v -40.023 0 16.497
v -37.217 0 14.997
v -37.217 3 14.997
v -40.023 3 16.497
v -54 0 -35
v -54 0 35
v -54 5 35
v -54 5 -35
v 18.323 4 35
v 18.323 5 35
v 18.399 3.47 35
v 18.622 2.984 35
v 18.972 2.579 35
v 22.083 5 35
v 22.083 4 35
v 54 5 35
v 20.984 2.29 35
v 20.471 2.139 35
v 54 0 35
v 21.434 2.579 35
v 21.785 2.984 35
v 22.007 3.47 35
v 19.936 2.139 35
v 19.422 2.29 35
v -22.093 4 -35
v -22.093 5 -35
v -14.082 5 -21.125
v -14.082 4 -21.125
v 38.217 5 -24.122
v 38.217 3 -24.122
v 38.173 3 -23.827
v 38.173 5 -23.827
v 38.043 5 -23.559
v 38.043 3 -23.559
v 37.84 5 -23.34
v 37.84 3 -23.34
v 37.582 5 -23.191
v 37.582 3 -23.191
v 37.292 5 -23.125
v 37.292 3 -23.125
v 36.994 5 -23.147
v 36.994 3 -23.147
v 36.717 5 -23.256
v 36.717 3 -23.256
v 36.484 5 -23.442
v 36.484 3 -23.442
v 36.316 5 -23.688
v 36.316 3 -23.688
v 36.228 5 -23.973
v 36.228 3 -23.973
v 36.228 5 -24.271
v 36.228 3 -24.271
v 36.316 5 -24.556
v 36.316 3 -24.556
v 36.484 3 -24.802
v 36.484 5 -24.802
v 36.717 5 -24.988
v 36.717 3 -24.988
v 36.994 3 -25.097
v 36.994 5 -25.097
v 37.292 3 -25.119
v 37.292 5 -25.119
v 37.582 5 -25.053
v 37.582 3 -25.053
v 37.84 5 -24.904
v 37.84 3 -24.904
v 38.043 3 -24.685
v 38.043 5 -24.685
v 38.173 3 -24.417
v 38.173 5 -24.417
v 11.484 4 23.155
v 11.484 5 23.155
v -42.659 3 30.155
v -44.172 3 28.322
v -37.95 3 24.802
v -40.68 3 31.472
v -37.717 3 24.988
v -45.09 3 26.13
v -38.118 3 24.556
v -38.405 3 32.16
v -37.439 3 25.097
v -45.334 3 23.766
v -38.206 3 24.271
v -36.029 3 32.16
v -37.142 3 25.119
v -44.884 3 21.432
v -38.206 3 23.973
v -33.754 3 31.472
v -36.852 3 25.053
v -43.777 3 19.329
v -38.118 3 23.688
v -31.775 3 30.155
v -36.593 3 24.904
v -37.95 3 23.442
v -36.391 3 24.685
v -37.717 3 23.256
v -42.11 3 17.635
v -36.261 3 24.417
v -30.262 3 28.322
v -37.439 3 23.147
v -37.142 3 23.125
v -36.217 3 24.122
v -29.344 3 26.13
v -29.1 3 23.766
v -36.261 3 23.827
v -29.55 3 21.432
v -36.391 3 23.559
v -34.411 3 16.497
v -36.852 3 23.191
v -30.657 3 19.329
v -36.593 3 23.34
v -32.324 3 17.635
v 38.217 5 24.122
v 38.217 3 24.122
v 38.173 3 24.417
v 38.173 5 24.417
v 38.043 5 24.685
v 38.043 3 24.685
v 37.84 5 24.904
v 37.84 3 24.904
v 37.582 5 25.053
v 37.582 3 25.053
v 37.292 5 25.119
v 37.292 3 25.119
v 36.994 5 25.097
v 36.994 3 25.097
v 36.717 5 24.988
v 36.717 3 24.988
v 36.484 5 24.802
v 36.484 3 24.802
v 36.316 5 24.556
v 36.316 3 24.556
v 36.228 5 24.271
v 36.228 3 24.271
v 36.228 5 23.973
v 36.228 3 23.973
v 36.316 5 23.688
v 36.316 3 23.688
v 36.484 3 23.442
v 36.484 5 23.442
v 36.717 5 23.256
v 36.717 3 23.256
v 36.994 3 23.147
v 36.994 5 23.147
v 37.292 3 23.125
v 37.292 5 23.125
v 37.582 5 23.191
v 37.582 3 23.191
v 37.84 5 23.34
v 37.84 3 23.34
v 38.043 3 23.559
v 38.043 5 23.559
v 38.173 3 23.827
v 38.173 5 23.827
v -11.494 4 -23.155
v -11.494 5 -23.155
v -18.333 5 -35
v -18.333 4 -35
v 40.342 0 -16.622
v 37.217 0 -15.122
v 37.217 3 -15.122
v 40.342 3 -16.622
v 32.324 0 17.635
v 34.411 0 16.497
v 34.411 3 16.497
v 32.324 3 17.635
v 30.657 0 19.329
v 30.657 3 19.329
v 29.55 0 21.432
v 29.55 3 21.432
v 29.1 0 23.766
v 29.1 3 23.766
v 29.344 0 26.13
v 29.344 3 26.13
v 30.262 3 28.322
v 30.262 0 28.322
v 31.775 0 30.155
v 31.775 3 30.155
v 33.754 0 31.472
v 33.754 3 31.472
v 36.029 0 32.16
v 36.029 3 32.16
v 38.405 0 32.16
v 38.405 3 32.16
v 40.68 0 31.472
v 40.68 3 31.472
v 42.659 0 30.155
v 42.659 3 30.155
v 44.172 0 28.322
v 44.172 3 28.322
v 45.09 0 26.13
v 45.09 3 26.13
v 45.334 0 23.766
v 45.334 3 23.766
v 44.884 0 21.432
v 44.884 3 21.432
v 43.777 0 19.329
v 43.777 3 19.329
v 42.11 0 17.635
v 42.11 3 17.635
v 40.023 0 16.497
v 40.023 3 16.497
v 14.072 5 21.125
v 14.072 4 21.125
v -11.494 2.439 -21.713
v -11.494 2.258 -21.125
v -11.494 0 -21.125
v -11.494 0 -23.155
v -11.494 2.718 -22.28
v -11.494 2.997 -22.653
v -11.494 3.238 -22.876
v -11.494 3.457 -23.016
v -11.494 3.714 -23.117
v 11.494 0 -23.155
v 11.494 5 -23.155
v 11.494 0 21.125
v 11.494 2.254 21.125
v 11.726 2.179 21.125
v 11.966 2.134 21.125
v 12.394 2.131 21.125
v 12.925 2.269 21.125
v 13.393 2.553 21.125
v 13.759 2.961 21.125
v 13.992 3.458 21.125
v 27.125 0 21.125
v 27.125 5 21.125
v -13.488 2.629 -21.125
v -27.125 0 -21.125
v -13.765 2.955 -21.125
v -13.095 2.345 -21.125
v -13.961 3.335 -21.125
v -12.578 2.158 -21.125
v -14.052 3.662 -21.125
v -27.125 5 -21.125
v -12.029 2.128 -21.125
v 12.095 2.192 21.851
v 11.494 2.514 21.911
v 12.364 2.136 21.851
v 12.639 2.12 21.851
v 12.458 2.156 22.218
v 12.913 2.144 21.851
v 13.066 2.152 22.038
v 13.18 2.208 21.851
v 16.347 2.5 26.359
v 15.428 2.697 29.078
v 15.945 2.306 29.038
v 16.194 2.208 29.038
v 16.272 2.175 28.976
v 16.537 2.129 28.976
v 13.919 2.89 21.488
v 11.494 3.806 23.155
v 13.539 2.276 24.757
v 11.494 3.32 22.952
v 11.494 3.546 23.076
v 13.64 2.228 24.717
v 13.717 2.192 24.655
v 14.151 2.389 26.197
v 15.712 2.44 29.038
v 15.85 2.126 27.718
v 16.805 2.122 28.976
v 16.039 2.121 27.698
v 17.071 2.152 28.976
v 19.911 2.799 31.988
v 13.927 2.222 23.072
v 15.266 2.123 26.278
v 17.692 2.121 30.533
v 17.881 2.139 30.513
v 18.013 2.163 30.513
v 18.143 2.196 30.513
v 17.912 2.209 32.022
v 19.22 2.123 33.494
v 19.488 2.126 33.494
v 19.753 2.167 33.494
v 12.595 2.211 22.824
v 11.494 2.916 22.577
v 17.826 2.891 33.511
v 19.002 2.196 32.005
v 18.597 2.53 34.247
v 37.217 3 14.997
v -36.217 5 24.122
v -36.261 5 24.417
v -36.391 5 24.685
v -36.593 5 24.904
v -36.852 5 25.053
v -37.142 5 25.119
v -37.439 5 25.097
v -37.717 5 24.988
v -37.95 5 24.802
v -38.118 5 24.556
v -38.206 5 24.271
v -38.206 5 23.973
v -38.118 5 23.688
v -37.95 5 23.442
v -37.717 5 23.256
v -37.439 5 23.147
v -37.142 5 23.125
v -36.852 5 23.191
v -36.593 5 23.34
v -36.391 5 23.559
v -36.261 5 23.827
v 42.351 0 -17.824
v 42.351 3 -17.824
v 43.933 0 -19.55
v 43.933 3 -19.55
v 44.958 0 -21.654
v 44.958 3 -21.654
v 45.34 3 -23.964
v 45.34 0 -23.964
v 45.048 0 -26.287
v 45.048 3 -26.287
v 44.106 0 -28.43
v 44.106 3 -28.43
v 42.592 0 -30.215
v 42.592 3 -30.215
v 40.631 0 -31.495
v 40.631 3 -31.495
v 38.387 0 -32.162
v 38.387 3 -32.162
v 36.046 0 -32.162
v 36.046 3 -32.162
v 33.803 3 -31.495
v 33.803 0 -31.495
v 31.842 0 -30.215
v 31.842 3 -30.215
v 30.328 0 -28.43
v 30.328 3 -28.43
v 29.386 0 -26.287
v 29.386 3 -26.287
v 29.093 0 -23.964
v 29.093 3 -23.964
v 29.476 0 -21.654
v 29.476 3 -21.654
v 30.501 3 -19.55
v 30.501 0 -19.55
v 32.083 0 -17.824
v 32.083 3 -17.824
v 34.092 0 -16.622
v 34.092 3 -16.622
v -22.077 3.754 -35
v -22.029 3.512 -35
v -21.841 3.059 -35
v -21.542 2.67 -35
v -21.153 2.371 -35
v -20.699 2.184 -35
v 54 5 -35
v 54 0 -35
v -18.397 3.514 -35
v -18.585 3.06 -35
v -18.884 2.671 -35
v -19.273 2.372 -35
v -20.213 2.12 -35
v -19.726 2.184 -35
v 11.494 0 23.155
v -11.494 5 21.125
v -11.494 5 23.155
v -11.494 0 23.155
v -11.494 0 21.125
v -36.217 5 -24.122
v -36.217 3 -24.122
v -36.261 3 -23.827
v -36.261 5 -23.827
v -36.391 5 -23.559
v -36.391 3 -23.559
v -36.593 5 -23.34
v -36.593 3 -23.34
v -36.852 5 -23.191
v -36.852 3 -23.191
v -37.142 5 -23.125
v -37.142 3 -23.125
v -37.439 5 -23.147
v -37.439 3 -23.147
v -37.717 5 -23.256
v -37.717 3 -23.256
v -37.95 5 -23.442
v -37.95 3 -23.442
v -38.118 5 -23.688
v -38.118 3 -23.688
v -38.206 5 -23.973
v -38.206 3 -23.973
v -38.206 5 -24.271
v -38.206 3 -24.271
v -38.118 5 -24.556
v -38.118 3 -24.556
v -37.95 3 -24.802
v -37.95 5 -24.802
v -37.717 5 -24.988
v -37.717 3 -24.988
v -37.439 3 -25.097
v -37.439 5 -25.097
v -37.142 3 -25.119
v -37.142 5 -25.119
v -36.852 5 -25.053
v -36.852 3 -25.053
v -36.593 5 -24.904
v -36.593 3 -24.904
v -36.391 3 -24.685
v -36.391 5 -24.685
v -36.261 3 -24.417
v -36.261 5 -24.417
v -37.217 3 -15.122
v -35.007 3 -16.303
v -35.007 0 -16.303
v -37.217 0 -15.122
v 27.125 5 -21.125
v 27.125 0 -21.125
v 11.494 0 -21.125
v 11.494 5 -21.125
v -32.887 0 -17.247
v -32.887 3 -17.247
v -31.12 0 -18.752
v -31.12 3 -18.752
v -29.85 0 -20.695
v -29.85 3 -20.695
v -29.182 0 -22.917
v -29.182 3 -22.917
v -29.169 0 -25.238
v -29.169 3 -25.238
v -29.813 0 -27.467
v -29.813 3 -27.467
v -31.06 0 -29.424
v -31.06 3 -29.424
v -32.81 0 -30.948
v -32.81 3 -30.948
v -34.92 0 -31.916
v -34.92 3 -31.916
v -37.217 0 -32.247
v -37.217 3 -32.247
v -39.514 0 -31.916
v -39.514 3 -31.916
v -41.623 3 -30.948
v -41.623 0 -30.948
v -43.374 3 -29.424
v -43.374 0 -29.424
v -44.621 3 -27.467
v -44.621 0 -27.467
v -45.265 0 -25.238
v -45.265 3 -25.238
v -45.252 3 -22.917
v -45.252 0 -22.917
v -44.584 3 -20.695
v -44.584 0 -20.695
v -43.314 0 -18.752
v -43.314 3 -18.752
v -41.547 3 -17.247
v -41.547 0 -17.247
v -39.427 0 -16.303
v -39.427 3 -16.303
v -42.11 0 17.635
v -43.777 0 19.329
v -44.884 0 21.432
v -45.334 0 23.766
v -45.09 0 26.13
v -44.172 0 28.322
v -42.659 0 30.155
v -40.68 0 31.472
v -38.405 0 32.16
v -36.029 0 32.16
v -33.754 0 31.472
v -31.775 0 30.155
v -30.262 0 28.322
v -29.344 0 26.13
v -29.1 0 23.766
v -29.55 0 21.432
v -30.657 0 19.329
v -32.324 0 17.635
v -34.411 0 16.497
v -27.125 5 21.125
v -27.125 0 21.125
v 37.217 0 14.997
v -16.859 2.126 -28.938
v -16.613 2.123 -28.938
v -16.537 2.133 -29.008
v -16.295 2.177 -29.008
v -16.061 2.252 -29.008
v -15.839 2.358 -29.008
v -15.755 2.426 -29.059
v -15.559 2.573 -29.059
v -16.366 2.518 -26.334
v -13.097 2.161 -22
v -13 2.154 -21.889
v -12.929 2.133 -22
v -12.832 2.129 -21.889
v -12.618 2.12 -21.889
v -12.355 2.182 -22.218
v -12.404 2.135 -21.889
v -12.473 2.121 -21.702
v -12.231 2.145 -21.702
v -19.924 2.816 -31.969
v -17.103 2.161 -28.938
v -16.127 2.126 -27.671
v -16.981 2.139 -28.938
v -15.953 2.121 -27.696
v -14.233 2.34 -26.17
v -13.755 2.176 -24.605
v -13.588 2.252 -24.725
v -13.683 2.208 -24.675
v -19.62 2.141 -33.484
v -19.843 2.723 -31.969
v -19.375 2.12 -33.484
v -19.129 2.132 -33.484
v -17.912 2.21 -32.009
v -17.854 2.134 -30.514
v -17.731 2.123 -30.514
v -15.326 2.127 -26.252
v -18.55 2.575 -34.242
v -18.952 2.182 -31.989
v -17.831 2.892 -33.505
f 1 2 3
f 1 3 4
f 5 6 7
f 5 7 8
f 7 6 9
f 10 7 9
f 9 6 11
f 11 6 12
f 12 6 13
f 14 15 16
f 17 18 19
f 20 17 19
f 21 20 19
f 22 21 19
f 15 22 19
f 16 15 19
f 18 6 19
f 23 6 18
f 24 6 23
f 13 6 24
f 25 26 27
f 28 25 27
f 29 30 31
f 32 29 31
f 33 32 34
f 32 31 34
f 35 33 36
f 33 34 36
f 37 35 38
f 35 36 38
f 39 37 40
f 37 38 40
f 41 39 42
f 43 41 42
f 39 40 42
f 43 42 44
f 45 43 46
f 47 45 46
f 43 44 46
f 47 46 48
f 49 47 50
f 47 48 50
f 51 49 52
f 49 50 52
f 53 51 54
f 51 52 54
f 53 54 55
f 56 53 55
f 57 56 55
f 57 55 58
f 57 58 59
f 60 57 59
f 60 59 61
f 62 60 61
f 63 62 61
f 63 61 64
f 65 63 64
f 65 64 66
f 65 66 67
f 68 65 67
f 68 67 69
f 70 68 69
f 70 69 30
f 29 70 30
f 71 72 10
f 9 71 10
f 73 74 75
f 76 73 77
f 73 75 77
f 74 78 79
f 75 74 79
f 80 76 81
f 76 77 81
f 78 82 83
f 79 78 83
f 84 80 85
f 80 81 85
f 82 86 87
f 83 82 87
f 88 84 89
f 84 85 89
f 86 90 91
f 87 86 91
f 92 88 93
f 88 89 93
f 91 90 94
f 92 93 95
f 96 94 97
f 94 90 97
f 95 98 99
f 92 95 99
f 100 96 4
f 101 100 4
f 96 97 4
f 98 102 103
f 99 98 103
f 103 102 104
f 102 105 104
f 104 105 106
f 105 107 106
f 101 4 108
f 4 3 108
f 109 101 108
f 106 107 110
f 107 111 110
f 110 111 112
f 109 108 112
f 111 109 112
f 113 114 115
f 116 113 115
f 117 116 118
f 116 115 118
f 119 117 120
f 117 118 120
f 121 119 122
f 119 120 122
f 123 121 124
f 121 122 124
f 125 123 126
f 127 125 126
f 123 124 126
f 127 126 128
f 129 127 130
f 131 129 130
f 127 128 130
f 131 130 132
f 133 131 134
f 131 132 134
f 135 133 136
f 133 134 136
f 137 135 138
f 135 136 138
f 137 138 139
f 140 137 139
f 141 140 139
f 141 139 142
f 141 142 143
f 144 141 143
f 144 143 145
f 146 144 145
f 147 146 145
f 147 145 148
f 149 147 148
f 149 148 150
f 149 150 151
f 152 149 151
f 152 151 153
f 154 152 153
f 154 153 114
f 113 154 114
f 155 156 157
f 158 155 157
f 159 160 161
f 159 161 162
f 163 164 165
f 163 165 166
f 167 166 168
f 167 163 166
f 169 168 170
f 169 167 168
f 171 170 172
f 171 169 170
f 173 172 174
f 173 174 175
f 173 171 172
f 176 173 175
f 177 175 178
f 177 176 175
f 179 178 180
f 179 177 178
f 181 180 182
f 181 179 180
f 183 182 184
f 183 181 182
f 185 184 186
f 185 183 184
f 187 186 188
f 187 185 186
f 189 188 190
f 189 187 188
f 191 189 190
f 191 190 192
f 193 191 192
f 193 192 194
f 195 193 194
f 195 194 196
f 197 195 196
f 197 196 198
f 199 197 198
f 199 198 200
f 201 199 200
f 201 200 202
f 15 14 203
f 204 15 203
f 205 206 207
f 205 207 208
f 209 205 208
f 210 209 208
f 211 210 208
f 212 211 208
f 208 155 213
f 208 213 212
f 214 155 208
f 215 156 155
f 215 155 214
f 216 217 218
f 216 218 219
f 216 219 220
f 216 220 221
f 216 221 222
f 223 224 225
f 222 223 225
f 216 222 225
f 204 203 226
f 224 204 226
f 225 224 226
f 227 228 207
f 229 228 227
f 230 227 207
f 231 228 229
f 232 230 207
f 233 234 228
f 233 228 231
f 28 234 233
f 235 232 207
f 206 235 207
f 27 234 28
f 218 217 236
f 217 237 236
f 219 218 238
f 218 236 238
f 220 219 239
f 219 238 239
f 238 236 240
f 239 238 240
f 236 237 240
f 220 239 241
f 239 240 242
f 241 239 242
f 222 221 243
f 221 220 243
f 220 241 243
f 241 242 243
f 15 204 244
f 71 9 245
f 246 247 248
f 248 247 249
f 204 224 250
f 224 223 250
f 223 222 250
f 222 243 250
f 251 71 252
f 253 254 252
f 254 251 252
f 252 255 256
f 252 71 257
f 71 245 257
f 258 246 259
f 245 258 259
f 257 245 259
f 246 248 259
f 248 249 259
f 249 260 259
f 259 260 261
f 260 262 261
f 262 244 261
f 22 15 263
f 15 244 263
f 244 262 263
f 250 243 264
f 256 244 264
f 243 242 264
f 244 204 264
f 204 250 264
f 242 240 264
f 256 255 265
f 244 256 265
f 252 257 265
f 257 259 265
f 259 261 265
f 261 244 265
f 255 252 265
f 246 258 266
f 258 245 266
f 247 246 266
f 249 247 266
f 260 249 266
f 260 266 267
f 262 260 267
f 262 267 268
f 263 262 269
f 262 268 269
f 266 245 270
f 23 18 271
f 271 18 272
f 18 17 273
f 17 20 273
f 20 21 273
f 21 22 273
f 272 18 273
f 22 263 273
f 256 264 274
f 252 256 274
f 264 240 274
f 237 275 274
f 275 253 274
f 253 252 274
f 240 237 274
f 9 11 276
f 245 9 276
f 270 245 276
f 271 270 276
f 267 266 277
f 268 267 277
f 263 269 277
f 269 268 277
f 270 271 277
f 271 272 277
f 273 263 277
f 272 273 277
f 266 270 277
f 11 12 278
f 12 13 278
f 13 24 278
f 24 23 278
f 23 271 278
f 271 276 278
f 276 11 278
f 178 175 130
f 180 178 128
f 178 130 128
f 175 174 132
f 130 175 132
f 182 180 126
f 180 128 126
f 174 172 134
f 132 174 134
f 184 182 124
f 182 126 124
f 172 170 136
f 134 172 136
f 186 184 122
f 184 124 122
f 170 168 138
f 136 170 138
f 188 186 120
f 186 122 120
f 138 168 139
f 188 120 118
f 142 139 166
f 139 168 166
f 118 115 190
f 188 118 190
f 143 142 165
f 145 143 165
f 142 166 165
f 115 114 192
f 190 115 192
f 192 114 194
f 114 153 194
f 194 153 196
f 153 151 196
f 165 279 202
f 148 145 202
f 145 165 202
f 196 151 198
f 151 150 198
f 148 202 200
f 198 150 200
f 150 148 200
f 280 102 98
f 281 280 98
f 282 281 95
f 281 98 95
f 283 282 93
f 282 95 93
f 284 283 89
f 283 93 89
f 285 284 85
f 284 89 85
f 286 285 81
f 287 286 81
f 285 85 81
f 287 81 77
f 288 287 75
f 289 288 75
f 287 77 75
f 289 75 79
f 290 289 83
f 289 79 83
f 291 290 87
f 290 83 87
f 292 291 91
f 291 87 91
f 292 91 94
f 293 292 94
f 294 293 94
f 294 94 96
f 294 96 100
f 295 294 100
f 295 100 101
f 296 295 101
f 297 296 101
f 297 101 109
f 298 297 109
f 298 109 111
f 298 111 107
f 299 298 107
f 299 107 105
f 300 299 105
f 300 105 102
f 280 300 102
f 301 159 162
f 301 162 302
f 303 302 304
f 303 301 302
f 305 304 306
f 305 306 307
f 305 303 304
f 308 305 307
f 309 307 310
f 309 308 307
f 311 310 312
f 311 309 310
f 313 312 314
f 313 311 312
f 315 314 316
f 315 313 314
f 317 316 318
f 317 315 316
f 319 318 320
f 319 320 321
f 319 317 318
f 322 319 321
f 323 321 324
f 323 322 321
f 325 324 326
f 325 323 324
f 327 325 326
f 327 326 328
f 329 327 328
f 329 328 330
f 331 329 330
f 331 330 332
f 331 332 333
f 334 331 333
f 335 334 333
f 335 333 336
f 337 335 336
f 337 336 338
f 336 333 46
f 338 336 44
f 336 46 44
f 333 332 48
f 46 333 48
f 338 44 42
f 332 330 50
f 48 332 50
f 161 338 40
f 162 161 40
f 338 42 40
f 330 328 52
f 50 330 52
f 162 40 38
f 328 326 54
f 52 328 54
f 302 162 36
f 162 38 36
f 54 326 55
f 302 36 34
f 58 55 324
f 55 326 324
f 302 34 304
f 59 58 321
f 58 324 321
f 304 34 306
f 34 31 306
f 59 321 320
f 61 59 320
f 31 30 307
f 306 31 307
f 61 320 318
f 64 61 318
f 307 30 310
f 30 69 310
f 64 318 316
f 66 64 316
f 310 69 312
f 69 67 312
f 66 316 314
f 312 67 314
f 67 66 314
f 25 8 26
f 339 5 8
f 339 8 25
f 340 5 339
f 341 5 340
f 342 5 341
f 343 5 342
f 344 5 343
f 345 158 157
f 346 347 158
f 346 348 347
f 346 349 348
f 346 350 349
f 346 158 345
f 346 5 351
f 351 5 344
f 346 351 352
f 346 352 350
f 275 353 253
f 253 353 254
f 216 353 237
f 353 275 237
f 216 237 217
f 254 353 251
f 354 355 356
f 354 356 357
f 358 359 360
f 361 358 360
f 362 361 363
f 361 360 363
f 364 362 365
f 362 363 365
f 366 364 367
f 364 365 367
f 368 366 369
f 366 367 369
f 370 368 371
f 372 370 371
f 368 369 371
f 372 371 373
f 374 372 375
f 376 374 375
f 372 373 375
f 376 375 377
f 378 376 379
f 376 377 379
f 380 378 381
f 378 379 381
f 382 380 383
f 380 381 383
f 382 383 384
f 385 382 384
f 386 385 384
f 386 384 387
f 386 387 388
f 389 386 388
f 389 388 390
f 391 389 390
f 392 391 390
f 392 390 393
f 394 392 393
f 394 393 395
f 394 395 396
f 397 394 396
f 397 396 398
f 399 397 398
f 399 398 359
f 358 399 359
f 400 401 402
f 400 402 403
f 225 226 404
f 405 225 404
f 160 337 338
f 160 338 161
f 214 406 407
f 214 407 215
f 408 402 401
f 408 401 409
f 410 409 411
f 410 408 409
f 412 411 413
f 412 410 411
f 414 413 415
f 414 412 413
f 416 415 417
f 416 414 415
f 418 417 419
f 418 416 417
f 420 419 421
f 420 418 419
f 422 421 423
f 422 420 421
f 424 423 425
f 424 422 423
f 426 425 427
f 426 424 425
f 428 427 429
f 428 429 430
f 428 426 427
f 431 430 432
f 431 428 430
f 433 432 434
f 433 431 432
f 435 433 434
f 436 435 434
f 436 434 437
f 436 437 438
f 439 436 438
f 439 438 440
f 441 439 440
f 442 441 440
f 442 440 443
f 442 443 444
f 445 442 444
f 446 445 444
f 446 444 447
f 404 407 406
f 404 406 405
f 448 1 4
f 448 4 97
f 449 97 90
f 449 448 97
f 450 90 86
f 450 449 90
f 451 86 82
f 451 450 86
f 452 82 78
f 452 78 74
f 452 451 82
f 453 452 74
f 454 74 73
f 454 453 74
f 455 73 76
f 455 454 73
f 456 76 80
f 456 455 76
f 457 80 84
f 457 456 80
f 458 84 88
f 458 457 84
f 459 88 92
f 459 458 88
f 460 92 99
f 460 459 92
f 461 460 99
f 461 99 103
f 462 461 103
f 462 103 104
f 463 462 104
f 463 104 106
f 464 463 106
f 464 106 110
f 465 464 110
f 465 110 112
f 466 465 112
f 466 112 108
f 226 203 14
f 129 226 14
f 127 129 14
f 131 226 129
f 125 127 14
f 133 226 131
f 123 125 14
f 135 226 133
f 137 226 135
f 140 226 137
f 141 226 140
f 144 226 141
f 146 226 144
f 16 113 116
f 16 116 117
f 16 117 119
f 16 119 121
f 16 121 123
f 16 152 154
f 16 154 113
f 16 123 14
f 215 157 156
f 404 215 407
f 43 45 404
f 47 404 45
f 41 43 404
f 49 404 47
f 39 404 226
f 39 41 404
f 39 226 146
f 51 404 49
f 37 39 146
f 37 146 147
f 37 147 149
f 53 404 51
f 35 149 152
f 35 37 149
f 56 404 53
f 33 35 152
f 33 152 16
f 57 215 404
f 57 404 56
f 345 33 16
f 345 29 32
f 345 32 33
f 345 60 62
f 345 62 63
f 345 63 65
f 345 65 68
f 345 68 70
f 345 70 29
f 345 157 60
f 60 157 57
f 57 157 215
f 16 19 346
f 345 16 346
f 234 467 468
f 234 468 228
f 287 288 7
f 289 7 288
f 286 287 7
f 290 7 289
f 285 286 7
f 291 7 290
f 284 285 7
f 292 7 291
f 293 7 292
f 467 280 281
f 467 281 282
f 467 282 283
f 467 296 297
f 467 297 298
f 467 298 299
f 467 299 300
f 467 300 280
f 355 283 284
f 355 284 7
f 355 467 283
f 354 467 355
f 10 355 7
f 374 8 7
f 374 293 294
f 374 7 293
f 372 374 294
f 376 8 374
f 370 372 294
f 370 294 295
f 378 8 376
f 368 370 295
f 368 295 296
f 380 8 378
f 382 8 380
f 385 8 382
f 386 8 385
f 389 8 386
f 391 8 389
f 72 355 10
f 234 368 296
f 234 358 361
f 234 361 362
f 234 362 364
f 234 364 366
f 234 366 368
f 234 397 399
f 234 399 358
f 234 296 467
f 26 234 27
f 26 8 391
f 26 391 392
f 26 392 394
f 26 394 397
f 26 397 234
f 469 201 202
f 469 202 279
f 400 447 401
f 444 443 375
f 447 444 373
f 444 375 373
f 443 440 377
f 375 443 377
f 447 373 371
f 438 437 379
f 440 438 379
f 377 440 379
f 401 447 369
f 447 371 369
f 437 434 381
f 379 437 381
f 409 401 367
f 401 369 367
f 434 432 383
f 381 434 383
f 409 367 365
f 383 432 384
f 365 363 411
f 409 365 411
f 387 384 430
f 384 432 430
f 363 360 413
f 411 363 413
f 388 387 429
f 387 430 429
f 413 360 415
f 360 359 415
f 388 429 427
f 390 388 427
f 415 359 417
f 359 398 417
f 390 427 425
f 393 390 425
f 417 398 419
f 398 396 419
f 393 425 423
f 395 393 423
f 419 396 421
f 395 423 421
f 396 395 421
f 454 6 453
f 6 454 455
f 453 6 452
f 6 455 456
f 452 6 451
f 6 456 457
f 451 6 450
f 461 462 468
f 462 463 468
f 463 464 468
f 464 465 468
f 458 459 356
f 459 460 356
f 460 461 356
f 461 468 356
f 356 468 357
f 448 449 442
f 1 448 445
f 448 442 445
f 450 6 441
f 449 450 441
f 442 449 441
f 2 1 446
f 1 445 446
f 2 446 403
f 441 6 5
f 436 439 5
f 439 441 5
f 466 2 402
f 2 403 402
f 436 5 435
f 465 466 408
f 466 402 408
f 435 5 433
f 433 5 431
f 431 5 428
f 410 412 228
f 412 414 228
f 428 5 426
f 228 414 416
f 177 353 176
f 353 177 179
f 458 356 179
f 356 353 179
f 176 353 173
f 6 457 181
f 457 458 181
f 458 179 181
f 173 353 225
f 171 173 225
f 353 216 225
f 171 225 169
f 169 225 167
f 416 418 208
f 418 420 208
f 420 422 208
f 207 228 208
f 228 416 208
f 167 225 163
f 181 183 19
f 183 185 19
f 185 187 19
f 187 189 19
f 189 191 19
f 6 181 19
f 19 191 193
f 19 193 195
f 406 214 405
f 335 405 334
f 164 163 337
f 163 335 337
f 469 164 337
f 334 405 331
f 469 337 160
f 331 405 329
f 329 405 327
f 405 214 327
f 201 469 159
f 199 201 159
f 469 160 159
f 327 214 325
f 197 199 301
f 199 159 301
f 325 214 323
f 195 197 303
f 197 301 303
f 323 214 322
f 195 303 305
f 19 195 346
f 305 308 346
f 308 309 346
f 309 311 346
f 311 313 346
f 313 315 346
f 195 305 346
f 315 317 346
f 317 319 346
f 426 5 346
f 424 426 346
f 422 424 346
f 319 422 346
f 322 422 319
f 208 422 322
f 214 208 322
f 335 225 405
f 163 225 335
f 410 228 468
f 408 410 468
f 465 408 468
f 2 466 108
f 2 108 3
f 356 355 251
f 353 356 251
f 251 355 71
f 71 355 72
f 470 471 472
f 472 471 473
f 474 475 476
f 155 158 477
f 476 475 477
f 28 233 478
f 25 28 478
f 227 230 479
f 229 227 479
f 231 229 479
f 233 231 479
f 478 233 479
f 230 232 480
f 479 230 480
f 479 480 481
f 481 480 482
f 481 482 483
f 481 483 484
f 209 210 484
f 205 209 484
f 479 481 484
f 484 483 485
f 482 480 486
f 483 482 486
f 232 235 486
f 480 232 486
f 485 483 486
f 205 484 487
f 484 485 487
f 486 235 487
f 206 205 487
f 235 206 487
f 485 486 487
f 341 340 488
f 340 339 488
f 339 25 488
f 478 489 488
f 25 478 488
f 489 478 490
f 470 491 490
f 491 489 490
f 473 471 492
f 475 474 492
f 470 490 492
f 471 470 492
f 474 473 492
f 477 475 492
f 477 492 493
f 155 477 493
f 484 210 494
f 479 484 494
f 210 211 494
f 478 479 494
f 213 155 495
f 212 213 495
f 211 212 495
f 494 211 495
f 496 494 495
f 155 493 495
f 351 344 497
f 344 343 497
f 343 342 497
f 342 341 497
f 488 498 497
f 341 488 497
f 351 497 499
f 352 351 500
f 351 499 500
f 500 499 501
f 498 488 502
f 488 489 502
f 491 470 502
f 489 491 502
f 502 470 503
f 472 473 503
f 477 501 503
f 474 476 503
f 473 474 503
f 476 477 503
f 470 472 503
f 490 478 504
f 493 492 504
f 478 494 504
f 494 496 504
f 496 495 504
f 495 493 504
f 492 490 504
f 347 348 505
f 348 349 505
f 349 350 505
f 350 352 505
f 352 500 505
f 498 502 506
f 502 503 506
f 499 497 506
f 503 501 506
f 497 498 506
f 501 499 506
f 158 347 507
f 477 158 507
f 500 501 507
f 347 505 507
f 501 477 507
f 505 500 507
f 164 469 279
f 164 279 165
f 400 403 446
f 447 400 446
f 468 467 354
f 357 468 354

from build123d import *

# Parameters (mm, degrees)
SCHIZZO1_W                   = 108
SCHIZZO1_H                   = 70
SCHIZZO1_R                   = 8.125
ESTRUSIONE_ESTRUSIONE2_DEPTH = 5
TAGLIO_ESTRUSIONE4_DEPTH     = 1
SCHIZZO8_R                   = 1.88
TAGLIO_ESTRUSIONE5_DEPTH     = 95
SCHIZZO9_W                   = 54
SCHIZZO9_H                   = 42
TAGLIO_ESTRUSIONE6_DEPTH     = 10
SCHIZZO10_W                  = 22.988764944
SCHIZZO10_H                  = 46.310438252
TAGLIO_ESTRUSIONE7_DEPTH     = 10
SCHIZZO11_W                  = 54.25
SCHIZZO11_H                  = 42.25
TAGLIO_ESTRUSIONE8_DEPTH     = 10
SCHIZZO14_R                  = 8.125
ESTRUSIONE_ESTRUSIONE3_DEPTH = 2
SCHIZZO15_R                  = 8.125
ESTRUSIONE_ESTRUSIONE4_DEPTH = 2
TAGLIO_ESTRUSIONE10_DEPTH    = 3
SCHIZZO17_R                  = 1
TAGLIO_ESTRUSIONE11_DEPTH    = 3


with BuildPart() as part:
    # Schizzo1 → Estrusione-Estrusione2 (new body)
    with BuildSketch(Plane(origin=(0, 0, 0), x_dir=(1, 0, 0), z_dir=(0, 1, 0))):
        Rectangle(SCHIZZO1_W, SCHIZZO1_H)
        with Locations((-37.216940269, -24.122090915)):
            Circle(SCHIZZO1_R, mode=Mode.SUBTRACT)
        with Locations((-37.216940269, 24.122090915)):
            Circle(SCHIZZO1_R, mode=Mode.SUBTRACT)
        with Locations((37.216940269, 24.122090915)):
            Circle(SCHIZZO1_R, mode=Mode.SUBTRACT)
        with Locations((37.216940269, -24.122090915)):
            Circle(SCHIZZO1_R, mode=Mode.SUBTRACT)
        with BuildLine():
            Line((16.970562748, 21), (-16.970562748, 21))
            ThreePointArc((-16.970562748, 21), (-27, 0), (-16.970562748, -21))
            Line((-16.970562748, -21), (16.970562748, -21))
            ThreePointArc((16.970562748, -21), (27, 0), (16.970562748, 21))
        make_face(mode=Mode.SUBTRACT)
    extrude(amount=ESTRUSIONE_ESTRUSIONE2_DEPTH)

    # Schizzo5 → Taglio-Estrusione4 (cut)
    with BuildSketch(Plane(origin=(0, 5, 0), x_dir=(1, 0, 0), z_dir=(0, 1, 0))):
        Polygon((-22.093333333, 35), (18.323333333, -35), (22.083333333, -35), (-18.333333333, 35), align=None)
    extrude(amount=-TAGLIO_ESTRUSIONE4_DEPTH, mode=Mode.SUBTRACT)

    # Schizzo8 → Taglio-Estrusione5 (cut, along a direction that is not the sketch's normal)
    with BuildSketch(Plane.XY.offset(35)):
        with Locations((20.203333333, 4)):
            Circle(SCHIZZO8_R)
    extrude(amount=-TAGLIO_ESTRUSIONE5_DEPTH, dir=(0.500019929, 0, 0.866013898), mode=Mode.SUBTRACT)

    # Schizzo9 → Taglio-Estrusione6 (cut)
    with BuildSketch(Plane(origin=(0, 5, 0), x_dir=(1, 0, 0), z_dir=(0, 1, 0))):
        Rectangle(SCHIZZO9_W, SCHIZZO9_H)
    extrude(amount=-TAGLIO_ESTRUSIONE6_DEPTH, mode=Mode.SUBTRACT)

    # Schizzo10 → Taglio-Estrusione7 (cut)
    with BuildSketch(Plane(origin=(0, 5, 0), x_dir=(1, 0, 0), z_dir=(0, 1, 0))):
        Rectangle(SCHIZZO10_W, SCHIZZO10_H)
    extrude(amount=-TAGLIO_ESTRUSIONE7_DEPTH, mode=Mode.SUBTRACT)

    # Schizzo11 → Taglio-Estrusione8 (cut)
    with BuildSketch(Plane(origin=(0, 5, 0), x_dir=(1, 0, 0), z_dir=(0, 1, 0))):
        Rectangle(SCHIZZO11_W, SCHIZZO11_H)
    extrude(amount=-TAGLIO_ESTRUSIONE8_DEPTH, mode=Mode.SUBTRACT)

    # Schizzo14 → Estrusione-Estrusione3 (add)
    with BuildSketch(Plane(origin=(0, 5, 0), x_dir=(1, 0, 0), z_dir=(0, 1, 0))):
        with Locations((37.216940269, 24.122090915)):
            Circle(SCHIZZO14_R)
        with Locations((37.216940269, -24.122090915)):
            Circle(SCHIZZO14_R)
    extrude(amount=-ESTRUSIONE_ESTRUSIONE3_DEPTH)

    # Schizzo15 → Estrusione-Estrusione4 (add)
    with BuildSketch(Plane(origin=(0, 5, 0), x_dir=(1, 0, 0), z_dir=(0, 1, 0))):
        with Locations((-37.216940269, 24.122090915)):
            Circle(SCHIZZO15_R)
        with Locations((-37.216940269, -24.122090915)):
            Circle(SCHIZZO15_R)
    extrude(amount=-ESTRUSIONE_ESTRUSIONE4_DEPTH)

    # Schizzo16 → Taglio-Estrusione10 (cut)
    with BuildSketch(Plane.XZ):
        Polygon((-40.023183309, 16.497090915), (-34.410697229, 16.497090915), (-37.216940269, 14.997090915), align=None)
        Polygon((-40.023183309, -16.622090915), (-34.410697229, -16.622090915), (-37.216940269, -15.122090915), align=None)
        Polygon((34.410697229, 16.497090915), (40.023183309, 16.497090915), (37.216940269, 14.997090915), align=None)
        Polygon((34.091940269, -16.622090915), (37.216940269, -15.122090915), (40.341940269, -16.622090915), align=None)
    extrude(amount=-TAGLIO_ESTRUSIONE10_DEPTH, mode=Mode.SUBTRACT)

    # Schizzo17 → Taglio-Estrusione11 (cut)
    with BuildSketch(Plane.XZ.offset(-3)):
        with Locations((-37.216940269, 24.122090915)):
            Circle(SCHIZZO17_R)
        with Locations((37.216940269, 24.122090915)):
            Circle(SCHIZZO17_R)
        with Locations((37.216940269, -24.122090915)):
            Circle(SCHIZZO17_R)
        with Locations((-37.216940269, -24.122090915)):
            Circle(SCHIZZO17_R)
    extrude(amount=-TAGLIO_ESTRUSIONE11_DEPTH, mode=Mode.SUBTRACT)


solid = part.part
